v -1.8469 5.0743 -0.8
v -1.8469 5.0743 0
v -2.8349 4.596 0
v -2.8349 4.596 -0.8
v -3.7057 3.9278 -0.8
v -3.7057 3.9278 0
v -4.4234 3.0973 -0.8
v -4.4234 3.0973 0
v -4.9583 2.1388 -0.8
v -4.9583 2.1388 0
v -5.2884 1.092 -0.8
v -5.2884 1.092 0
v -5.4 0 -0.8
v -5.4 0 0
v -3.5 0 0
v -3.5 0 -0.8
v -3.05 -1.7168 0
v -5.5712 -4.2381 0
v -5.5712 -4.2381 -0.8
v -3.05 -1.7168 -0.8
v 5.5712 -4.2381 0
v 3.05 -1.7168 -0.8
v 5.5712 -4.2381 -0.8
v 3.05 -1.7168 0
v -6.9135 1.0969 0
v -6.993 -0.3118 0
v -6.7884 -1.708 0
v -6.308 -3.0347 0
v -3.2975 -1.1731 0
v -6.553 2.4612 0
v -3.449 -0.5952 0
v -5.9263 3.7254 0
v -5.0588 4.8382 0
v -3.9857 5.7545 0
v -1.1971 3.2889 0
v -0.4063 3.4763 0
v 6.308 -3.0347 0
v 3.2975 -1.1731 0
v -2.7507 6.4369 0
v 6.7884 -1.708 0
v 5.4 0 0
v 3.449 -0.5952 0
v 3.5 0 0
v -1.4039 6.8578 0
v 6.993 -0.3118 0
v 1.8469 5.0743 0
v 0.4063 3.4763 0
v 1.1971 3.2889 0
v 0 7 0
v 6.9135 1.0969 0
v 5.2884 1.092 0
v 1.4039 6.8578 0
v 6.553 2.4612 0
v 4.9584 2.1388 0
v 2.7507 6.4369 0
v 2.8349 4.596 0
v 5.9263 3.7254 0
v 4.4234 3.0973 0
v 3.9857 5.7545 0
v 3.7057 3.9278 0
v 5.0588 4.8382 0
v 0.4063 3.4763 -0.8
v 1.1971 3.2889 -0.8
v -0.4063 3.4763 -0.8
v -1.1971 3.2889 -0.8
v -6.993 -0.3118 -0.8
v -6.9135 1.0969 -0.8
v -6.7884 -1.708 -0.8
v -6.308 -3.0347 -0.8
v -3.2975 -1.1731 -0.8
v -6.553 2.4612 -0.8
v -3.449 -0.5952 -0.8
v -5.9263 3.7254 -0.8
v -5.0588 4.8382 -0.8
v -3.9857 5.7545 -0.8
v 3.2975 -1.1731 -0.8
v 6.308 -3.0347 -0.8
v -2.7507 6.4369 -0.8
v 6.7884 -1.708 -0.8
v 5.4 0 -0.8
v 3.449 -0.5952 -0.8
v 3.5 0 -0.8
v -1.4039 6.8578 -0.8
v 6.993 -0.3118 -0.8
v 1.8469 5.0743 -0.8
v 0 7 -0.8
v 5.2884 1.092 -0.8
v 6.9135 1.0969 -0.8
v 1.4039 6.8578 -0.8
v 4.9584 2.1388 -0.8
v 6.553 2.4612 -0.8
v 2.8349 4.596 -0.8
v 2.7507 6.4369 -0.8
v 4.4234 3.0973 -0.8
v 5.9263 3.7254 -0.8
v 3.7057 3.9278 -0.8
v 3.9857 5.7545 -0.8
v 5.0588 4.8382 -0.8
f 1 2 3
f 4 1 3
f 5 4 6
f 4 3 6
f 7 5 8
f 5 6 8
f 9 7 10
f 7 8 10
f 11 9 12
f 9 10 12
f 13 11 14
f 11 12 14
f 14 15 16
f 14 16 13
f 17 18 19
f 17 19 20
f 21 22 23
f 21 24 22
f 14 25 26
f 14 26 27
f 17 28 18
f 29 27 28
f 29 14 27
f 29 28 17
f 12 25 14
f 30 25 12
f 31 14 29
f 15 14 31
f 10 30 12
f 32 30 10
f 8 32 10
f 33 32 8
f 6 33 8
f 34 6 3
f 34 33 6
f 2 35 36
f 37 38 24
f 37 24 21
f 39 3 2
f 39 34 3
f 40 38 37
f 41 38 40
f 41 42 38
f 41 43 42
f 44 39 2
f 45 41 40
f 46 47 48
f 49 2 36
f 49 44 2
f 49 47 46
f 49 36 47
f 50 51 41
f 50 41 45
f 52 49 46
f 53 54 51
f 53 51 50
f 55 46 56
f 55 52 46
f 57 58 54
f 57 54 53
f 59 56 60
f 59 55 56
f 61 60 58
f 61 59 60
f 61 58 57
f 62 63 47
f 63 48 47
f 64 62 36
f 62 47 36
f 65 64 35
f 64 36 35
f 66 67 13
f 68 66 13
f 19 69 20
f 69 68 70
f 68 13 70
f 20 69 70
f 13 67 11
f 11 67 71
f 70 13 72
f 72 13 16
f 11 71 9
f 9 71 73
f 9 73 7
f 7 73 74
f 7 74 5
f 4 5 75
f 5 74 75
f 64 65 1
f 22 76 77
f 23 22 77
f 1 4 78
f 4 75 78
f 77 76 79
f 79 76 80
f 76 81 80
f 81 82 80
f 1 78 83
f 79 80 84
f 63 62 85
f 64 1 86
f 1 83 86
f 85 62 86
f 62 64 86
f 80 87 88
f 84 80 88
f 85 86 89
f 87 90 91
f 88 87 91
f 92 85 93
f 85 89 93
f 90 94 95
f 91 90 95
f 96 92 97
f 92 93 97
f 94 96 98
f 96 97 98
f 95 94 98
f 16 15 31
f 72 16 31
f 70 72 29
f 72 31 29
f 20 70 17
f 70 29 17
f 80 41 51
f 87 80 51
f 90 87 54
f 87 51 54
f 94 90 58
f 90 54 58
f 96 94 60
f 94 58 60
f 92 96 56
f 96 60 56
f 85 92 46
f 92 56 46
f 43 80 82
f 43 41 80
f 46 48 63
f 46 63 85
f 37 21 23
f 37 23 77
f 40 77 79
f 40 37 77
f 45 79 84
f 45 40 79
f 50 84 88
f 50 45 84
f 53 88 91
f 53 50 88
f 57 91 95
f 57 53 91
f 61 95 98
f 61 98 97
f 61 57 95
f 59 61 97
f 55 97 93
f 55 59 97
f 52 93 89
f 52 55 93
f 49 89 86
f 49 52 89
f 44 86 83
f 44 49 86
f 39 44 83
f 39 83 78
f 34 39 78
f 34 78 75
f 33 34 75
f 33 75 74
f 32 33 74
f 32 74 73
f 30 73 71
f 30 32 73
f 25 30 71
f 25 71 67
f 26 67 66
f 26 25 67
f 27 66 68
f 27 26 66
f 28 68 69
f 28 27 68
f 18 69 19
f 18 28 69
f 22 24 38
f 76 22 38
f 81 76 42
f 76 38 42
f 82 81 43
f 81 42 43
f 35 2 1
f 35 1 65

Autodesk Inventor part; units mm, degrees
sketch "__1" plane through (0, 0, 0) normal (0, 0, 1) x (1, 0, 0)
  arc A0 (5.5712, -4.2381) -> (-5.5712, -4.2381) centre (0, 0) ccw
  line L0 (-5.5712, -4.2381) -> (-3.05, -1.7168)
  arc A1 (-3.5, 0) -> (-3.05, -1.7168) centre (0, 0) ccw
  line L1 (-3.5, 0) -> (-5.4, 0)
  arc A2 (-1.8469, 5.0743) -> (-5.4, 0) centre (0, 0) ccw
  line L2 (-1.8469, 5.0743) -> (-1.1971, 3.2889)
  arc A3 (1.1971, 3.2889) -> (-1.1971, 3.2889) centre (0, 0) ccw
  line L3 (1.1971, 3.2889) -> (1.8469, 5.0743)
  arc A4 (5.4, 0) -> (1.8469, 5.0743) centre (0, 0) ccw
  line L4 (5.4, 0) -> (3.5, 0)
  arc A5 (3.05, -1.7168) -> (3.5, 0) centre (0, 0) ccw
  line L5 (3.05, -1.7168) -> (5.5712, -4.2381)
extrude "Extrusion1" add sketch "__1" against normal blind 0.8
ref_plane "CA3_XY" through (0, 0, -0.4) normal (-1, 0, 0) x (0, 0, -1)
ref_plane "CA3_YZ" through (0, 0, -0.4) normal (0, 0, -1) x (0, -1, 0)
ref_plane "CA3_ZX" through (0, 0, -0.4) normal (0, -1, 0) x (-1, 0, 0)
properties part number "METW-7"
